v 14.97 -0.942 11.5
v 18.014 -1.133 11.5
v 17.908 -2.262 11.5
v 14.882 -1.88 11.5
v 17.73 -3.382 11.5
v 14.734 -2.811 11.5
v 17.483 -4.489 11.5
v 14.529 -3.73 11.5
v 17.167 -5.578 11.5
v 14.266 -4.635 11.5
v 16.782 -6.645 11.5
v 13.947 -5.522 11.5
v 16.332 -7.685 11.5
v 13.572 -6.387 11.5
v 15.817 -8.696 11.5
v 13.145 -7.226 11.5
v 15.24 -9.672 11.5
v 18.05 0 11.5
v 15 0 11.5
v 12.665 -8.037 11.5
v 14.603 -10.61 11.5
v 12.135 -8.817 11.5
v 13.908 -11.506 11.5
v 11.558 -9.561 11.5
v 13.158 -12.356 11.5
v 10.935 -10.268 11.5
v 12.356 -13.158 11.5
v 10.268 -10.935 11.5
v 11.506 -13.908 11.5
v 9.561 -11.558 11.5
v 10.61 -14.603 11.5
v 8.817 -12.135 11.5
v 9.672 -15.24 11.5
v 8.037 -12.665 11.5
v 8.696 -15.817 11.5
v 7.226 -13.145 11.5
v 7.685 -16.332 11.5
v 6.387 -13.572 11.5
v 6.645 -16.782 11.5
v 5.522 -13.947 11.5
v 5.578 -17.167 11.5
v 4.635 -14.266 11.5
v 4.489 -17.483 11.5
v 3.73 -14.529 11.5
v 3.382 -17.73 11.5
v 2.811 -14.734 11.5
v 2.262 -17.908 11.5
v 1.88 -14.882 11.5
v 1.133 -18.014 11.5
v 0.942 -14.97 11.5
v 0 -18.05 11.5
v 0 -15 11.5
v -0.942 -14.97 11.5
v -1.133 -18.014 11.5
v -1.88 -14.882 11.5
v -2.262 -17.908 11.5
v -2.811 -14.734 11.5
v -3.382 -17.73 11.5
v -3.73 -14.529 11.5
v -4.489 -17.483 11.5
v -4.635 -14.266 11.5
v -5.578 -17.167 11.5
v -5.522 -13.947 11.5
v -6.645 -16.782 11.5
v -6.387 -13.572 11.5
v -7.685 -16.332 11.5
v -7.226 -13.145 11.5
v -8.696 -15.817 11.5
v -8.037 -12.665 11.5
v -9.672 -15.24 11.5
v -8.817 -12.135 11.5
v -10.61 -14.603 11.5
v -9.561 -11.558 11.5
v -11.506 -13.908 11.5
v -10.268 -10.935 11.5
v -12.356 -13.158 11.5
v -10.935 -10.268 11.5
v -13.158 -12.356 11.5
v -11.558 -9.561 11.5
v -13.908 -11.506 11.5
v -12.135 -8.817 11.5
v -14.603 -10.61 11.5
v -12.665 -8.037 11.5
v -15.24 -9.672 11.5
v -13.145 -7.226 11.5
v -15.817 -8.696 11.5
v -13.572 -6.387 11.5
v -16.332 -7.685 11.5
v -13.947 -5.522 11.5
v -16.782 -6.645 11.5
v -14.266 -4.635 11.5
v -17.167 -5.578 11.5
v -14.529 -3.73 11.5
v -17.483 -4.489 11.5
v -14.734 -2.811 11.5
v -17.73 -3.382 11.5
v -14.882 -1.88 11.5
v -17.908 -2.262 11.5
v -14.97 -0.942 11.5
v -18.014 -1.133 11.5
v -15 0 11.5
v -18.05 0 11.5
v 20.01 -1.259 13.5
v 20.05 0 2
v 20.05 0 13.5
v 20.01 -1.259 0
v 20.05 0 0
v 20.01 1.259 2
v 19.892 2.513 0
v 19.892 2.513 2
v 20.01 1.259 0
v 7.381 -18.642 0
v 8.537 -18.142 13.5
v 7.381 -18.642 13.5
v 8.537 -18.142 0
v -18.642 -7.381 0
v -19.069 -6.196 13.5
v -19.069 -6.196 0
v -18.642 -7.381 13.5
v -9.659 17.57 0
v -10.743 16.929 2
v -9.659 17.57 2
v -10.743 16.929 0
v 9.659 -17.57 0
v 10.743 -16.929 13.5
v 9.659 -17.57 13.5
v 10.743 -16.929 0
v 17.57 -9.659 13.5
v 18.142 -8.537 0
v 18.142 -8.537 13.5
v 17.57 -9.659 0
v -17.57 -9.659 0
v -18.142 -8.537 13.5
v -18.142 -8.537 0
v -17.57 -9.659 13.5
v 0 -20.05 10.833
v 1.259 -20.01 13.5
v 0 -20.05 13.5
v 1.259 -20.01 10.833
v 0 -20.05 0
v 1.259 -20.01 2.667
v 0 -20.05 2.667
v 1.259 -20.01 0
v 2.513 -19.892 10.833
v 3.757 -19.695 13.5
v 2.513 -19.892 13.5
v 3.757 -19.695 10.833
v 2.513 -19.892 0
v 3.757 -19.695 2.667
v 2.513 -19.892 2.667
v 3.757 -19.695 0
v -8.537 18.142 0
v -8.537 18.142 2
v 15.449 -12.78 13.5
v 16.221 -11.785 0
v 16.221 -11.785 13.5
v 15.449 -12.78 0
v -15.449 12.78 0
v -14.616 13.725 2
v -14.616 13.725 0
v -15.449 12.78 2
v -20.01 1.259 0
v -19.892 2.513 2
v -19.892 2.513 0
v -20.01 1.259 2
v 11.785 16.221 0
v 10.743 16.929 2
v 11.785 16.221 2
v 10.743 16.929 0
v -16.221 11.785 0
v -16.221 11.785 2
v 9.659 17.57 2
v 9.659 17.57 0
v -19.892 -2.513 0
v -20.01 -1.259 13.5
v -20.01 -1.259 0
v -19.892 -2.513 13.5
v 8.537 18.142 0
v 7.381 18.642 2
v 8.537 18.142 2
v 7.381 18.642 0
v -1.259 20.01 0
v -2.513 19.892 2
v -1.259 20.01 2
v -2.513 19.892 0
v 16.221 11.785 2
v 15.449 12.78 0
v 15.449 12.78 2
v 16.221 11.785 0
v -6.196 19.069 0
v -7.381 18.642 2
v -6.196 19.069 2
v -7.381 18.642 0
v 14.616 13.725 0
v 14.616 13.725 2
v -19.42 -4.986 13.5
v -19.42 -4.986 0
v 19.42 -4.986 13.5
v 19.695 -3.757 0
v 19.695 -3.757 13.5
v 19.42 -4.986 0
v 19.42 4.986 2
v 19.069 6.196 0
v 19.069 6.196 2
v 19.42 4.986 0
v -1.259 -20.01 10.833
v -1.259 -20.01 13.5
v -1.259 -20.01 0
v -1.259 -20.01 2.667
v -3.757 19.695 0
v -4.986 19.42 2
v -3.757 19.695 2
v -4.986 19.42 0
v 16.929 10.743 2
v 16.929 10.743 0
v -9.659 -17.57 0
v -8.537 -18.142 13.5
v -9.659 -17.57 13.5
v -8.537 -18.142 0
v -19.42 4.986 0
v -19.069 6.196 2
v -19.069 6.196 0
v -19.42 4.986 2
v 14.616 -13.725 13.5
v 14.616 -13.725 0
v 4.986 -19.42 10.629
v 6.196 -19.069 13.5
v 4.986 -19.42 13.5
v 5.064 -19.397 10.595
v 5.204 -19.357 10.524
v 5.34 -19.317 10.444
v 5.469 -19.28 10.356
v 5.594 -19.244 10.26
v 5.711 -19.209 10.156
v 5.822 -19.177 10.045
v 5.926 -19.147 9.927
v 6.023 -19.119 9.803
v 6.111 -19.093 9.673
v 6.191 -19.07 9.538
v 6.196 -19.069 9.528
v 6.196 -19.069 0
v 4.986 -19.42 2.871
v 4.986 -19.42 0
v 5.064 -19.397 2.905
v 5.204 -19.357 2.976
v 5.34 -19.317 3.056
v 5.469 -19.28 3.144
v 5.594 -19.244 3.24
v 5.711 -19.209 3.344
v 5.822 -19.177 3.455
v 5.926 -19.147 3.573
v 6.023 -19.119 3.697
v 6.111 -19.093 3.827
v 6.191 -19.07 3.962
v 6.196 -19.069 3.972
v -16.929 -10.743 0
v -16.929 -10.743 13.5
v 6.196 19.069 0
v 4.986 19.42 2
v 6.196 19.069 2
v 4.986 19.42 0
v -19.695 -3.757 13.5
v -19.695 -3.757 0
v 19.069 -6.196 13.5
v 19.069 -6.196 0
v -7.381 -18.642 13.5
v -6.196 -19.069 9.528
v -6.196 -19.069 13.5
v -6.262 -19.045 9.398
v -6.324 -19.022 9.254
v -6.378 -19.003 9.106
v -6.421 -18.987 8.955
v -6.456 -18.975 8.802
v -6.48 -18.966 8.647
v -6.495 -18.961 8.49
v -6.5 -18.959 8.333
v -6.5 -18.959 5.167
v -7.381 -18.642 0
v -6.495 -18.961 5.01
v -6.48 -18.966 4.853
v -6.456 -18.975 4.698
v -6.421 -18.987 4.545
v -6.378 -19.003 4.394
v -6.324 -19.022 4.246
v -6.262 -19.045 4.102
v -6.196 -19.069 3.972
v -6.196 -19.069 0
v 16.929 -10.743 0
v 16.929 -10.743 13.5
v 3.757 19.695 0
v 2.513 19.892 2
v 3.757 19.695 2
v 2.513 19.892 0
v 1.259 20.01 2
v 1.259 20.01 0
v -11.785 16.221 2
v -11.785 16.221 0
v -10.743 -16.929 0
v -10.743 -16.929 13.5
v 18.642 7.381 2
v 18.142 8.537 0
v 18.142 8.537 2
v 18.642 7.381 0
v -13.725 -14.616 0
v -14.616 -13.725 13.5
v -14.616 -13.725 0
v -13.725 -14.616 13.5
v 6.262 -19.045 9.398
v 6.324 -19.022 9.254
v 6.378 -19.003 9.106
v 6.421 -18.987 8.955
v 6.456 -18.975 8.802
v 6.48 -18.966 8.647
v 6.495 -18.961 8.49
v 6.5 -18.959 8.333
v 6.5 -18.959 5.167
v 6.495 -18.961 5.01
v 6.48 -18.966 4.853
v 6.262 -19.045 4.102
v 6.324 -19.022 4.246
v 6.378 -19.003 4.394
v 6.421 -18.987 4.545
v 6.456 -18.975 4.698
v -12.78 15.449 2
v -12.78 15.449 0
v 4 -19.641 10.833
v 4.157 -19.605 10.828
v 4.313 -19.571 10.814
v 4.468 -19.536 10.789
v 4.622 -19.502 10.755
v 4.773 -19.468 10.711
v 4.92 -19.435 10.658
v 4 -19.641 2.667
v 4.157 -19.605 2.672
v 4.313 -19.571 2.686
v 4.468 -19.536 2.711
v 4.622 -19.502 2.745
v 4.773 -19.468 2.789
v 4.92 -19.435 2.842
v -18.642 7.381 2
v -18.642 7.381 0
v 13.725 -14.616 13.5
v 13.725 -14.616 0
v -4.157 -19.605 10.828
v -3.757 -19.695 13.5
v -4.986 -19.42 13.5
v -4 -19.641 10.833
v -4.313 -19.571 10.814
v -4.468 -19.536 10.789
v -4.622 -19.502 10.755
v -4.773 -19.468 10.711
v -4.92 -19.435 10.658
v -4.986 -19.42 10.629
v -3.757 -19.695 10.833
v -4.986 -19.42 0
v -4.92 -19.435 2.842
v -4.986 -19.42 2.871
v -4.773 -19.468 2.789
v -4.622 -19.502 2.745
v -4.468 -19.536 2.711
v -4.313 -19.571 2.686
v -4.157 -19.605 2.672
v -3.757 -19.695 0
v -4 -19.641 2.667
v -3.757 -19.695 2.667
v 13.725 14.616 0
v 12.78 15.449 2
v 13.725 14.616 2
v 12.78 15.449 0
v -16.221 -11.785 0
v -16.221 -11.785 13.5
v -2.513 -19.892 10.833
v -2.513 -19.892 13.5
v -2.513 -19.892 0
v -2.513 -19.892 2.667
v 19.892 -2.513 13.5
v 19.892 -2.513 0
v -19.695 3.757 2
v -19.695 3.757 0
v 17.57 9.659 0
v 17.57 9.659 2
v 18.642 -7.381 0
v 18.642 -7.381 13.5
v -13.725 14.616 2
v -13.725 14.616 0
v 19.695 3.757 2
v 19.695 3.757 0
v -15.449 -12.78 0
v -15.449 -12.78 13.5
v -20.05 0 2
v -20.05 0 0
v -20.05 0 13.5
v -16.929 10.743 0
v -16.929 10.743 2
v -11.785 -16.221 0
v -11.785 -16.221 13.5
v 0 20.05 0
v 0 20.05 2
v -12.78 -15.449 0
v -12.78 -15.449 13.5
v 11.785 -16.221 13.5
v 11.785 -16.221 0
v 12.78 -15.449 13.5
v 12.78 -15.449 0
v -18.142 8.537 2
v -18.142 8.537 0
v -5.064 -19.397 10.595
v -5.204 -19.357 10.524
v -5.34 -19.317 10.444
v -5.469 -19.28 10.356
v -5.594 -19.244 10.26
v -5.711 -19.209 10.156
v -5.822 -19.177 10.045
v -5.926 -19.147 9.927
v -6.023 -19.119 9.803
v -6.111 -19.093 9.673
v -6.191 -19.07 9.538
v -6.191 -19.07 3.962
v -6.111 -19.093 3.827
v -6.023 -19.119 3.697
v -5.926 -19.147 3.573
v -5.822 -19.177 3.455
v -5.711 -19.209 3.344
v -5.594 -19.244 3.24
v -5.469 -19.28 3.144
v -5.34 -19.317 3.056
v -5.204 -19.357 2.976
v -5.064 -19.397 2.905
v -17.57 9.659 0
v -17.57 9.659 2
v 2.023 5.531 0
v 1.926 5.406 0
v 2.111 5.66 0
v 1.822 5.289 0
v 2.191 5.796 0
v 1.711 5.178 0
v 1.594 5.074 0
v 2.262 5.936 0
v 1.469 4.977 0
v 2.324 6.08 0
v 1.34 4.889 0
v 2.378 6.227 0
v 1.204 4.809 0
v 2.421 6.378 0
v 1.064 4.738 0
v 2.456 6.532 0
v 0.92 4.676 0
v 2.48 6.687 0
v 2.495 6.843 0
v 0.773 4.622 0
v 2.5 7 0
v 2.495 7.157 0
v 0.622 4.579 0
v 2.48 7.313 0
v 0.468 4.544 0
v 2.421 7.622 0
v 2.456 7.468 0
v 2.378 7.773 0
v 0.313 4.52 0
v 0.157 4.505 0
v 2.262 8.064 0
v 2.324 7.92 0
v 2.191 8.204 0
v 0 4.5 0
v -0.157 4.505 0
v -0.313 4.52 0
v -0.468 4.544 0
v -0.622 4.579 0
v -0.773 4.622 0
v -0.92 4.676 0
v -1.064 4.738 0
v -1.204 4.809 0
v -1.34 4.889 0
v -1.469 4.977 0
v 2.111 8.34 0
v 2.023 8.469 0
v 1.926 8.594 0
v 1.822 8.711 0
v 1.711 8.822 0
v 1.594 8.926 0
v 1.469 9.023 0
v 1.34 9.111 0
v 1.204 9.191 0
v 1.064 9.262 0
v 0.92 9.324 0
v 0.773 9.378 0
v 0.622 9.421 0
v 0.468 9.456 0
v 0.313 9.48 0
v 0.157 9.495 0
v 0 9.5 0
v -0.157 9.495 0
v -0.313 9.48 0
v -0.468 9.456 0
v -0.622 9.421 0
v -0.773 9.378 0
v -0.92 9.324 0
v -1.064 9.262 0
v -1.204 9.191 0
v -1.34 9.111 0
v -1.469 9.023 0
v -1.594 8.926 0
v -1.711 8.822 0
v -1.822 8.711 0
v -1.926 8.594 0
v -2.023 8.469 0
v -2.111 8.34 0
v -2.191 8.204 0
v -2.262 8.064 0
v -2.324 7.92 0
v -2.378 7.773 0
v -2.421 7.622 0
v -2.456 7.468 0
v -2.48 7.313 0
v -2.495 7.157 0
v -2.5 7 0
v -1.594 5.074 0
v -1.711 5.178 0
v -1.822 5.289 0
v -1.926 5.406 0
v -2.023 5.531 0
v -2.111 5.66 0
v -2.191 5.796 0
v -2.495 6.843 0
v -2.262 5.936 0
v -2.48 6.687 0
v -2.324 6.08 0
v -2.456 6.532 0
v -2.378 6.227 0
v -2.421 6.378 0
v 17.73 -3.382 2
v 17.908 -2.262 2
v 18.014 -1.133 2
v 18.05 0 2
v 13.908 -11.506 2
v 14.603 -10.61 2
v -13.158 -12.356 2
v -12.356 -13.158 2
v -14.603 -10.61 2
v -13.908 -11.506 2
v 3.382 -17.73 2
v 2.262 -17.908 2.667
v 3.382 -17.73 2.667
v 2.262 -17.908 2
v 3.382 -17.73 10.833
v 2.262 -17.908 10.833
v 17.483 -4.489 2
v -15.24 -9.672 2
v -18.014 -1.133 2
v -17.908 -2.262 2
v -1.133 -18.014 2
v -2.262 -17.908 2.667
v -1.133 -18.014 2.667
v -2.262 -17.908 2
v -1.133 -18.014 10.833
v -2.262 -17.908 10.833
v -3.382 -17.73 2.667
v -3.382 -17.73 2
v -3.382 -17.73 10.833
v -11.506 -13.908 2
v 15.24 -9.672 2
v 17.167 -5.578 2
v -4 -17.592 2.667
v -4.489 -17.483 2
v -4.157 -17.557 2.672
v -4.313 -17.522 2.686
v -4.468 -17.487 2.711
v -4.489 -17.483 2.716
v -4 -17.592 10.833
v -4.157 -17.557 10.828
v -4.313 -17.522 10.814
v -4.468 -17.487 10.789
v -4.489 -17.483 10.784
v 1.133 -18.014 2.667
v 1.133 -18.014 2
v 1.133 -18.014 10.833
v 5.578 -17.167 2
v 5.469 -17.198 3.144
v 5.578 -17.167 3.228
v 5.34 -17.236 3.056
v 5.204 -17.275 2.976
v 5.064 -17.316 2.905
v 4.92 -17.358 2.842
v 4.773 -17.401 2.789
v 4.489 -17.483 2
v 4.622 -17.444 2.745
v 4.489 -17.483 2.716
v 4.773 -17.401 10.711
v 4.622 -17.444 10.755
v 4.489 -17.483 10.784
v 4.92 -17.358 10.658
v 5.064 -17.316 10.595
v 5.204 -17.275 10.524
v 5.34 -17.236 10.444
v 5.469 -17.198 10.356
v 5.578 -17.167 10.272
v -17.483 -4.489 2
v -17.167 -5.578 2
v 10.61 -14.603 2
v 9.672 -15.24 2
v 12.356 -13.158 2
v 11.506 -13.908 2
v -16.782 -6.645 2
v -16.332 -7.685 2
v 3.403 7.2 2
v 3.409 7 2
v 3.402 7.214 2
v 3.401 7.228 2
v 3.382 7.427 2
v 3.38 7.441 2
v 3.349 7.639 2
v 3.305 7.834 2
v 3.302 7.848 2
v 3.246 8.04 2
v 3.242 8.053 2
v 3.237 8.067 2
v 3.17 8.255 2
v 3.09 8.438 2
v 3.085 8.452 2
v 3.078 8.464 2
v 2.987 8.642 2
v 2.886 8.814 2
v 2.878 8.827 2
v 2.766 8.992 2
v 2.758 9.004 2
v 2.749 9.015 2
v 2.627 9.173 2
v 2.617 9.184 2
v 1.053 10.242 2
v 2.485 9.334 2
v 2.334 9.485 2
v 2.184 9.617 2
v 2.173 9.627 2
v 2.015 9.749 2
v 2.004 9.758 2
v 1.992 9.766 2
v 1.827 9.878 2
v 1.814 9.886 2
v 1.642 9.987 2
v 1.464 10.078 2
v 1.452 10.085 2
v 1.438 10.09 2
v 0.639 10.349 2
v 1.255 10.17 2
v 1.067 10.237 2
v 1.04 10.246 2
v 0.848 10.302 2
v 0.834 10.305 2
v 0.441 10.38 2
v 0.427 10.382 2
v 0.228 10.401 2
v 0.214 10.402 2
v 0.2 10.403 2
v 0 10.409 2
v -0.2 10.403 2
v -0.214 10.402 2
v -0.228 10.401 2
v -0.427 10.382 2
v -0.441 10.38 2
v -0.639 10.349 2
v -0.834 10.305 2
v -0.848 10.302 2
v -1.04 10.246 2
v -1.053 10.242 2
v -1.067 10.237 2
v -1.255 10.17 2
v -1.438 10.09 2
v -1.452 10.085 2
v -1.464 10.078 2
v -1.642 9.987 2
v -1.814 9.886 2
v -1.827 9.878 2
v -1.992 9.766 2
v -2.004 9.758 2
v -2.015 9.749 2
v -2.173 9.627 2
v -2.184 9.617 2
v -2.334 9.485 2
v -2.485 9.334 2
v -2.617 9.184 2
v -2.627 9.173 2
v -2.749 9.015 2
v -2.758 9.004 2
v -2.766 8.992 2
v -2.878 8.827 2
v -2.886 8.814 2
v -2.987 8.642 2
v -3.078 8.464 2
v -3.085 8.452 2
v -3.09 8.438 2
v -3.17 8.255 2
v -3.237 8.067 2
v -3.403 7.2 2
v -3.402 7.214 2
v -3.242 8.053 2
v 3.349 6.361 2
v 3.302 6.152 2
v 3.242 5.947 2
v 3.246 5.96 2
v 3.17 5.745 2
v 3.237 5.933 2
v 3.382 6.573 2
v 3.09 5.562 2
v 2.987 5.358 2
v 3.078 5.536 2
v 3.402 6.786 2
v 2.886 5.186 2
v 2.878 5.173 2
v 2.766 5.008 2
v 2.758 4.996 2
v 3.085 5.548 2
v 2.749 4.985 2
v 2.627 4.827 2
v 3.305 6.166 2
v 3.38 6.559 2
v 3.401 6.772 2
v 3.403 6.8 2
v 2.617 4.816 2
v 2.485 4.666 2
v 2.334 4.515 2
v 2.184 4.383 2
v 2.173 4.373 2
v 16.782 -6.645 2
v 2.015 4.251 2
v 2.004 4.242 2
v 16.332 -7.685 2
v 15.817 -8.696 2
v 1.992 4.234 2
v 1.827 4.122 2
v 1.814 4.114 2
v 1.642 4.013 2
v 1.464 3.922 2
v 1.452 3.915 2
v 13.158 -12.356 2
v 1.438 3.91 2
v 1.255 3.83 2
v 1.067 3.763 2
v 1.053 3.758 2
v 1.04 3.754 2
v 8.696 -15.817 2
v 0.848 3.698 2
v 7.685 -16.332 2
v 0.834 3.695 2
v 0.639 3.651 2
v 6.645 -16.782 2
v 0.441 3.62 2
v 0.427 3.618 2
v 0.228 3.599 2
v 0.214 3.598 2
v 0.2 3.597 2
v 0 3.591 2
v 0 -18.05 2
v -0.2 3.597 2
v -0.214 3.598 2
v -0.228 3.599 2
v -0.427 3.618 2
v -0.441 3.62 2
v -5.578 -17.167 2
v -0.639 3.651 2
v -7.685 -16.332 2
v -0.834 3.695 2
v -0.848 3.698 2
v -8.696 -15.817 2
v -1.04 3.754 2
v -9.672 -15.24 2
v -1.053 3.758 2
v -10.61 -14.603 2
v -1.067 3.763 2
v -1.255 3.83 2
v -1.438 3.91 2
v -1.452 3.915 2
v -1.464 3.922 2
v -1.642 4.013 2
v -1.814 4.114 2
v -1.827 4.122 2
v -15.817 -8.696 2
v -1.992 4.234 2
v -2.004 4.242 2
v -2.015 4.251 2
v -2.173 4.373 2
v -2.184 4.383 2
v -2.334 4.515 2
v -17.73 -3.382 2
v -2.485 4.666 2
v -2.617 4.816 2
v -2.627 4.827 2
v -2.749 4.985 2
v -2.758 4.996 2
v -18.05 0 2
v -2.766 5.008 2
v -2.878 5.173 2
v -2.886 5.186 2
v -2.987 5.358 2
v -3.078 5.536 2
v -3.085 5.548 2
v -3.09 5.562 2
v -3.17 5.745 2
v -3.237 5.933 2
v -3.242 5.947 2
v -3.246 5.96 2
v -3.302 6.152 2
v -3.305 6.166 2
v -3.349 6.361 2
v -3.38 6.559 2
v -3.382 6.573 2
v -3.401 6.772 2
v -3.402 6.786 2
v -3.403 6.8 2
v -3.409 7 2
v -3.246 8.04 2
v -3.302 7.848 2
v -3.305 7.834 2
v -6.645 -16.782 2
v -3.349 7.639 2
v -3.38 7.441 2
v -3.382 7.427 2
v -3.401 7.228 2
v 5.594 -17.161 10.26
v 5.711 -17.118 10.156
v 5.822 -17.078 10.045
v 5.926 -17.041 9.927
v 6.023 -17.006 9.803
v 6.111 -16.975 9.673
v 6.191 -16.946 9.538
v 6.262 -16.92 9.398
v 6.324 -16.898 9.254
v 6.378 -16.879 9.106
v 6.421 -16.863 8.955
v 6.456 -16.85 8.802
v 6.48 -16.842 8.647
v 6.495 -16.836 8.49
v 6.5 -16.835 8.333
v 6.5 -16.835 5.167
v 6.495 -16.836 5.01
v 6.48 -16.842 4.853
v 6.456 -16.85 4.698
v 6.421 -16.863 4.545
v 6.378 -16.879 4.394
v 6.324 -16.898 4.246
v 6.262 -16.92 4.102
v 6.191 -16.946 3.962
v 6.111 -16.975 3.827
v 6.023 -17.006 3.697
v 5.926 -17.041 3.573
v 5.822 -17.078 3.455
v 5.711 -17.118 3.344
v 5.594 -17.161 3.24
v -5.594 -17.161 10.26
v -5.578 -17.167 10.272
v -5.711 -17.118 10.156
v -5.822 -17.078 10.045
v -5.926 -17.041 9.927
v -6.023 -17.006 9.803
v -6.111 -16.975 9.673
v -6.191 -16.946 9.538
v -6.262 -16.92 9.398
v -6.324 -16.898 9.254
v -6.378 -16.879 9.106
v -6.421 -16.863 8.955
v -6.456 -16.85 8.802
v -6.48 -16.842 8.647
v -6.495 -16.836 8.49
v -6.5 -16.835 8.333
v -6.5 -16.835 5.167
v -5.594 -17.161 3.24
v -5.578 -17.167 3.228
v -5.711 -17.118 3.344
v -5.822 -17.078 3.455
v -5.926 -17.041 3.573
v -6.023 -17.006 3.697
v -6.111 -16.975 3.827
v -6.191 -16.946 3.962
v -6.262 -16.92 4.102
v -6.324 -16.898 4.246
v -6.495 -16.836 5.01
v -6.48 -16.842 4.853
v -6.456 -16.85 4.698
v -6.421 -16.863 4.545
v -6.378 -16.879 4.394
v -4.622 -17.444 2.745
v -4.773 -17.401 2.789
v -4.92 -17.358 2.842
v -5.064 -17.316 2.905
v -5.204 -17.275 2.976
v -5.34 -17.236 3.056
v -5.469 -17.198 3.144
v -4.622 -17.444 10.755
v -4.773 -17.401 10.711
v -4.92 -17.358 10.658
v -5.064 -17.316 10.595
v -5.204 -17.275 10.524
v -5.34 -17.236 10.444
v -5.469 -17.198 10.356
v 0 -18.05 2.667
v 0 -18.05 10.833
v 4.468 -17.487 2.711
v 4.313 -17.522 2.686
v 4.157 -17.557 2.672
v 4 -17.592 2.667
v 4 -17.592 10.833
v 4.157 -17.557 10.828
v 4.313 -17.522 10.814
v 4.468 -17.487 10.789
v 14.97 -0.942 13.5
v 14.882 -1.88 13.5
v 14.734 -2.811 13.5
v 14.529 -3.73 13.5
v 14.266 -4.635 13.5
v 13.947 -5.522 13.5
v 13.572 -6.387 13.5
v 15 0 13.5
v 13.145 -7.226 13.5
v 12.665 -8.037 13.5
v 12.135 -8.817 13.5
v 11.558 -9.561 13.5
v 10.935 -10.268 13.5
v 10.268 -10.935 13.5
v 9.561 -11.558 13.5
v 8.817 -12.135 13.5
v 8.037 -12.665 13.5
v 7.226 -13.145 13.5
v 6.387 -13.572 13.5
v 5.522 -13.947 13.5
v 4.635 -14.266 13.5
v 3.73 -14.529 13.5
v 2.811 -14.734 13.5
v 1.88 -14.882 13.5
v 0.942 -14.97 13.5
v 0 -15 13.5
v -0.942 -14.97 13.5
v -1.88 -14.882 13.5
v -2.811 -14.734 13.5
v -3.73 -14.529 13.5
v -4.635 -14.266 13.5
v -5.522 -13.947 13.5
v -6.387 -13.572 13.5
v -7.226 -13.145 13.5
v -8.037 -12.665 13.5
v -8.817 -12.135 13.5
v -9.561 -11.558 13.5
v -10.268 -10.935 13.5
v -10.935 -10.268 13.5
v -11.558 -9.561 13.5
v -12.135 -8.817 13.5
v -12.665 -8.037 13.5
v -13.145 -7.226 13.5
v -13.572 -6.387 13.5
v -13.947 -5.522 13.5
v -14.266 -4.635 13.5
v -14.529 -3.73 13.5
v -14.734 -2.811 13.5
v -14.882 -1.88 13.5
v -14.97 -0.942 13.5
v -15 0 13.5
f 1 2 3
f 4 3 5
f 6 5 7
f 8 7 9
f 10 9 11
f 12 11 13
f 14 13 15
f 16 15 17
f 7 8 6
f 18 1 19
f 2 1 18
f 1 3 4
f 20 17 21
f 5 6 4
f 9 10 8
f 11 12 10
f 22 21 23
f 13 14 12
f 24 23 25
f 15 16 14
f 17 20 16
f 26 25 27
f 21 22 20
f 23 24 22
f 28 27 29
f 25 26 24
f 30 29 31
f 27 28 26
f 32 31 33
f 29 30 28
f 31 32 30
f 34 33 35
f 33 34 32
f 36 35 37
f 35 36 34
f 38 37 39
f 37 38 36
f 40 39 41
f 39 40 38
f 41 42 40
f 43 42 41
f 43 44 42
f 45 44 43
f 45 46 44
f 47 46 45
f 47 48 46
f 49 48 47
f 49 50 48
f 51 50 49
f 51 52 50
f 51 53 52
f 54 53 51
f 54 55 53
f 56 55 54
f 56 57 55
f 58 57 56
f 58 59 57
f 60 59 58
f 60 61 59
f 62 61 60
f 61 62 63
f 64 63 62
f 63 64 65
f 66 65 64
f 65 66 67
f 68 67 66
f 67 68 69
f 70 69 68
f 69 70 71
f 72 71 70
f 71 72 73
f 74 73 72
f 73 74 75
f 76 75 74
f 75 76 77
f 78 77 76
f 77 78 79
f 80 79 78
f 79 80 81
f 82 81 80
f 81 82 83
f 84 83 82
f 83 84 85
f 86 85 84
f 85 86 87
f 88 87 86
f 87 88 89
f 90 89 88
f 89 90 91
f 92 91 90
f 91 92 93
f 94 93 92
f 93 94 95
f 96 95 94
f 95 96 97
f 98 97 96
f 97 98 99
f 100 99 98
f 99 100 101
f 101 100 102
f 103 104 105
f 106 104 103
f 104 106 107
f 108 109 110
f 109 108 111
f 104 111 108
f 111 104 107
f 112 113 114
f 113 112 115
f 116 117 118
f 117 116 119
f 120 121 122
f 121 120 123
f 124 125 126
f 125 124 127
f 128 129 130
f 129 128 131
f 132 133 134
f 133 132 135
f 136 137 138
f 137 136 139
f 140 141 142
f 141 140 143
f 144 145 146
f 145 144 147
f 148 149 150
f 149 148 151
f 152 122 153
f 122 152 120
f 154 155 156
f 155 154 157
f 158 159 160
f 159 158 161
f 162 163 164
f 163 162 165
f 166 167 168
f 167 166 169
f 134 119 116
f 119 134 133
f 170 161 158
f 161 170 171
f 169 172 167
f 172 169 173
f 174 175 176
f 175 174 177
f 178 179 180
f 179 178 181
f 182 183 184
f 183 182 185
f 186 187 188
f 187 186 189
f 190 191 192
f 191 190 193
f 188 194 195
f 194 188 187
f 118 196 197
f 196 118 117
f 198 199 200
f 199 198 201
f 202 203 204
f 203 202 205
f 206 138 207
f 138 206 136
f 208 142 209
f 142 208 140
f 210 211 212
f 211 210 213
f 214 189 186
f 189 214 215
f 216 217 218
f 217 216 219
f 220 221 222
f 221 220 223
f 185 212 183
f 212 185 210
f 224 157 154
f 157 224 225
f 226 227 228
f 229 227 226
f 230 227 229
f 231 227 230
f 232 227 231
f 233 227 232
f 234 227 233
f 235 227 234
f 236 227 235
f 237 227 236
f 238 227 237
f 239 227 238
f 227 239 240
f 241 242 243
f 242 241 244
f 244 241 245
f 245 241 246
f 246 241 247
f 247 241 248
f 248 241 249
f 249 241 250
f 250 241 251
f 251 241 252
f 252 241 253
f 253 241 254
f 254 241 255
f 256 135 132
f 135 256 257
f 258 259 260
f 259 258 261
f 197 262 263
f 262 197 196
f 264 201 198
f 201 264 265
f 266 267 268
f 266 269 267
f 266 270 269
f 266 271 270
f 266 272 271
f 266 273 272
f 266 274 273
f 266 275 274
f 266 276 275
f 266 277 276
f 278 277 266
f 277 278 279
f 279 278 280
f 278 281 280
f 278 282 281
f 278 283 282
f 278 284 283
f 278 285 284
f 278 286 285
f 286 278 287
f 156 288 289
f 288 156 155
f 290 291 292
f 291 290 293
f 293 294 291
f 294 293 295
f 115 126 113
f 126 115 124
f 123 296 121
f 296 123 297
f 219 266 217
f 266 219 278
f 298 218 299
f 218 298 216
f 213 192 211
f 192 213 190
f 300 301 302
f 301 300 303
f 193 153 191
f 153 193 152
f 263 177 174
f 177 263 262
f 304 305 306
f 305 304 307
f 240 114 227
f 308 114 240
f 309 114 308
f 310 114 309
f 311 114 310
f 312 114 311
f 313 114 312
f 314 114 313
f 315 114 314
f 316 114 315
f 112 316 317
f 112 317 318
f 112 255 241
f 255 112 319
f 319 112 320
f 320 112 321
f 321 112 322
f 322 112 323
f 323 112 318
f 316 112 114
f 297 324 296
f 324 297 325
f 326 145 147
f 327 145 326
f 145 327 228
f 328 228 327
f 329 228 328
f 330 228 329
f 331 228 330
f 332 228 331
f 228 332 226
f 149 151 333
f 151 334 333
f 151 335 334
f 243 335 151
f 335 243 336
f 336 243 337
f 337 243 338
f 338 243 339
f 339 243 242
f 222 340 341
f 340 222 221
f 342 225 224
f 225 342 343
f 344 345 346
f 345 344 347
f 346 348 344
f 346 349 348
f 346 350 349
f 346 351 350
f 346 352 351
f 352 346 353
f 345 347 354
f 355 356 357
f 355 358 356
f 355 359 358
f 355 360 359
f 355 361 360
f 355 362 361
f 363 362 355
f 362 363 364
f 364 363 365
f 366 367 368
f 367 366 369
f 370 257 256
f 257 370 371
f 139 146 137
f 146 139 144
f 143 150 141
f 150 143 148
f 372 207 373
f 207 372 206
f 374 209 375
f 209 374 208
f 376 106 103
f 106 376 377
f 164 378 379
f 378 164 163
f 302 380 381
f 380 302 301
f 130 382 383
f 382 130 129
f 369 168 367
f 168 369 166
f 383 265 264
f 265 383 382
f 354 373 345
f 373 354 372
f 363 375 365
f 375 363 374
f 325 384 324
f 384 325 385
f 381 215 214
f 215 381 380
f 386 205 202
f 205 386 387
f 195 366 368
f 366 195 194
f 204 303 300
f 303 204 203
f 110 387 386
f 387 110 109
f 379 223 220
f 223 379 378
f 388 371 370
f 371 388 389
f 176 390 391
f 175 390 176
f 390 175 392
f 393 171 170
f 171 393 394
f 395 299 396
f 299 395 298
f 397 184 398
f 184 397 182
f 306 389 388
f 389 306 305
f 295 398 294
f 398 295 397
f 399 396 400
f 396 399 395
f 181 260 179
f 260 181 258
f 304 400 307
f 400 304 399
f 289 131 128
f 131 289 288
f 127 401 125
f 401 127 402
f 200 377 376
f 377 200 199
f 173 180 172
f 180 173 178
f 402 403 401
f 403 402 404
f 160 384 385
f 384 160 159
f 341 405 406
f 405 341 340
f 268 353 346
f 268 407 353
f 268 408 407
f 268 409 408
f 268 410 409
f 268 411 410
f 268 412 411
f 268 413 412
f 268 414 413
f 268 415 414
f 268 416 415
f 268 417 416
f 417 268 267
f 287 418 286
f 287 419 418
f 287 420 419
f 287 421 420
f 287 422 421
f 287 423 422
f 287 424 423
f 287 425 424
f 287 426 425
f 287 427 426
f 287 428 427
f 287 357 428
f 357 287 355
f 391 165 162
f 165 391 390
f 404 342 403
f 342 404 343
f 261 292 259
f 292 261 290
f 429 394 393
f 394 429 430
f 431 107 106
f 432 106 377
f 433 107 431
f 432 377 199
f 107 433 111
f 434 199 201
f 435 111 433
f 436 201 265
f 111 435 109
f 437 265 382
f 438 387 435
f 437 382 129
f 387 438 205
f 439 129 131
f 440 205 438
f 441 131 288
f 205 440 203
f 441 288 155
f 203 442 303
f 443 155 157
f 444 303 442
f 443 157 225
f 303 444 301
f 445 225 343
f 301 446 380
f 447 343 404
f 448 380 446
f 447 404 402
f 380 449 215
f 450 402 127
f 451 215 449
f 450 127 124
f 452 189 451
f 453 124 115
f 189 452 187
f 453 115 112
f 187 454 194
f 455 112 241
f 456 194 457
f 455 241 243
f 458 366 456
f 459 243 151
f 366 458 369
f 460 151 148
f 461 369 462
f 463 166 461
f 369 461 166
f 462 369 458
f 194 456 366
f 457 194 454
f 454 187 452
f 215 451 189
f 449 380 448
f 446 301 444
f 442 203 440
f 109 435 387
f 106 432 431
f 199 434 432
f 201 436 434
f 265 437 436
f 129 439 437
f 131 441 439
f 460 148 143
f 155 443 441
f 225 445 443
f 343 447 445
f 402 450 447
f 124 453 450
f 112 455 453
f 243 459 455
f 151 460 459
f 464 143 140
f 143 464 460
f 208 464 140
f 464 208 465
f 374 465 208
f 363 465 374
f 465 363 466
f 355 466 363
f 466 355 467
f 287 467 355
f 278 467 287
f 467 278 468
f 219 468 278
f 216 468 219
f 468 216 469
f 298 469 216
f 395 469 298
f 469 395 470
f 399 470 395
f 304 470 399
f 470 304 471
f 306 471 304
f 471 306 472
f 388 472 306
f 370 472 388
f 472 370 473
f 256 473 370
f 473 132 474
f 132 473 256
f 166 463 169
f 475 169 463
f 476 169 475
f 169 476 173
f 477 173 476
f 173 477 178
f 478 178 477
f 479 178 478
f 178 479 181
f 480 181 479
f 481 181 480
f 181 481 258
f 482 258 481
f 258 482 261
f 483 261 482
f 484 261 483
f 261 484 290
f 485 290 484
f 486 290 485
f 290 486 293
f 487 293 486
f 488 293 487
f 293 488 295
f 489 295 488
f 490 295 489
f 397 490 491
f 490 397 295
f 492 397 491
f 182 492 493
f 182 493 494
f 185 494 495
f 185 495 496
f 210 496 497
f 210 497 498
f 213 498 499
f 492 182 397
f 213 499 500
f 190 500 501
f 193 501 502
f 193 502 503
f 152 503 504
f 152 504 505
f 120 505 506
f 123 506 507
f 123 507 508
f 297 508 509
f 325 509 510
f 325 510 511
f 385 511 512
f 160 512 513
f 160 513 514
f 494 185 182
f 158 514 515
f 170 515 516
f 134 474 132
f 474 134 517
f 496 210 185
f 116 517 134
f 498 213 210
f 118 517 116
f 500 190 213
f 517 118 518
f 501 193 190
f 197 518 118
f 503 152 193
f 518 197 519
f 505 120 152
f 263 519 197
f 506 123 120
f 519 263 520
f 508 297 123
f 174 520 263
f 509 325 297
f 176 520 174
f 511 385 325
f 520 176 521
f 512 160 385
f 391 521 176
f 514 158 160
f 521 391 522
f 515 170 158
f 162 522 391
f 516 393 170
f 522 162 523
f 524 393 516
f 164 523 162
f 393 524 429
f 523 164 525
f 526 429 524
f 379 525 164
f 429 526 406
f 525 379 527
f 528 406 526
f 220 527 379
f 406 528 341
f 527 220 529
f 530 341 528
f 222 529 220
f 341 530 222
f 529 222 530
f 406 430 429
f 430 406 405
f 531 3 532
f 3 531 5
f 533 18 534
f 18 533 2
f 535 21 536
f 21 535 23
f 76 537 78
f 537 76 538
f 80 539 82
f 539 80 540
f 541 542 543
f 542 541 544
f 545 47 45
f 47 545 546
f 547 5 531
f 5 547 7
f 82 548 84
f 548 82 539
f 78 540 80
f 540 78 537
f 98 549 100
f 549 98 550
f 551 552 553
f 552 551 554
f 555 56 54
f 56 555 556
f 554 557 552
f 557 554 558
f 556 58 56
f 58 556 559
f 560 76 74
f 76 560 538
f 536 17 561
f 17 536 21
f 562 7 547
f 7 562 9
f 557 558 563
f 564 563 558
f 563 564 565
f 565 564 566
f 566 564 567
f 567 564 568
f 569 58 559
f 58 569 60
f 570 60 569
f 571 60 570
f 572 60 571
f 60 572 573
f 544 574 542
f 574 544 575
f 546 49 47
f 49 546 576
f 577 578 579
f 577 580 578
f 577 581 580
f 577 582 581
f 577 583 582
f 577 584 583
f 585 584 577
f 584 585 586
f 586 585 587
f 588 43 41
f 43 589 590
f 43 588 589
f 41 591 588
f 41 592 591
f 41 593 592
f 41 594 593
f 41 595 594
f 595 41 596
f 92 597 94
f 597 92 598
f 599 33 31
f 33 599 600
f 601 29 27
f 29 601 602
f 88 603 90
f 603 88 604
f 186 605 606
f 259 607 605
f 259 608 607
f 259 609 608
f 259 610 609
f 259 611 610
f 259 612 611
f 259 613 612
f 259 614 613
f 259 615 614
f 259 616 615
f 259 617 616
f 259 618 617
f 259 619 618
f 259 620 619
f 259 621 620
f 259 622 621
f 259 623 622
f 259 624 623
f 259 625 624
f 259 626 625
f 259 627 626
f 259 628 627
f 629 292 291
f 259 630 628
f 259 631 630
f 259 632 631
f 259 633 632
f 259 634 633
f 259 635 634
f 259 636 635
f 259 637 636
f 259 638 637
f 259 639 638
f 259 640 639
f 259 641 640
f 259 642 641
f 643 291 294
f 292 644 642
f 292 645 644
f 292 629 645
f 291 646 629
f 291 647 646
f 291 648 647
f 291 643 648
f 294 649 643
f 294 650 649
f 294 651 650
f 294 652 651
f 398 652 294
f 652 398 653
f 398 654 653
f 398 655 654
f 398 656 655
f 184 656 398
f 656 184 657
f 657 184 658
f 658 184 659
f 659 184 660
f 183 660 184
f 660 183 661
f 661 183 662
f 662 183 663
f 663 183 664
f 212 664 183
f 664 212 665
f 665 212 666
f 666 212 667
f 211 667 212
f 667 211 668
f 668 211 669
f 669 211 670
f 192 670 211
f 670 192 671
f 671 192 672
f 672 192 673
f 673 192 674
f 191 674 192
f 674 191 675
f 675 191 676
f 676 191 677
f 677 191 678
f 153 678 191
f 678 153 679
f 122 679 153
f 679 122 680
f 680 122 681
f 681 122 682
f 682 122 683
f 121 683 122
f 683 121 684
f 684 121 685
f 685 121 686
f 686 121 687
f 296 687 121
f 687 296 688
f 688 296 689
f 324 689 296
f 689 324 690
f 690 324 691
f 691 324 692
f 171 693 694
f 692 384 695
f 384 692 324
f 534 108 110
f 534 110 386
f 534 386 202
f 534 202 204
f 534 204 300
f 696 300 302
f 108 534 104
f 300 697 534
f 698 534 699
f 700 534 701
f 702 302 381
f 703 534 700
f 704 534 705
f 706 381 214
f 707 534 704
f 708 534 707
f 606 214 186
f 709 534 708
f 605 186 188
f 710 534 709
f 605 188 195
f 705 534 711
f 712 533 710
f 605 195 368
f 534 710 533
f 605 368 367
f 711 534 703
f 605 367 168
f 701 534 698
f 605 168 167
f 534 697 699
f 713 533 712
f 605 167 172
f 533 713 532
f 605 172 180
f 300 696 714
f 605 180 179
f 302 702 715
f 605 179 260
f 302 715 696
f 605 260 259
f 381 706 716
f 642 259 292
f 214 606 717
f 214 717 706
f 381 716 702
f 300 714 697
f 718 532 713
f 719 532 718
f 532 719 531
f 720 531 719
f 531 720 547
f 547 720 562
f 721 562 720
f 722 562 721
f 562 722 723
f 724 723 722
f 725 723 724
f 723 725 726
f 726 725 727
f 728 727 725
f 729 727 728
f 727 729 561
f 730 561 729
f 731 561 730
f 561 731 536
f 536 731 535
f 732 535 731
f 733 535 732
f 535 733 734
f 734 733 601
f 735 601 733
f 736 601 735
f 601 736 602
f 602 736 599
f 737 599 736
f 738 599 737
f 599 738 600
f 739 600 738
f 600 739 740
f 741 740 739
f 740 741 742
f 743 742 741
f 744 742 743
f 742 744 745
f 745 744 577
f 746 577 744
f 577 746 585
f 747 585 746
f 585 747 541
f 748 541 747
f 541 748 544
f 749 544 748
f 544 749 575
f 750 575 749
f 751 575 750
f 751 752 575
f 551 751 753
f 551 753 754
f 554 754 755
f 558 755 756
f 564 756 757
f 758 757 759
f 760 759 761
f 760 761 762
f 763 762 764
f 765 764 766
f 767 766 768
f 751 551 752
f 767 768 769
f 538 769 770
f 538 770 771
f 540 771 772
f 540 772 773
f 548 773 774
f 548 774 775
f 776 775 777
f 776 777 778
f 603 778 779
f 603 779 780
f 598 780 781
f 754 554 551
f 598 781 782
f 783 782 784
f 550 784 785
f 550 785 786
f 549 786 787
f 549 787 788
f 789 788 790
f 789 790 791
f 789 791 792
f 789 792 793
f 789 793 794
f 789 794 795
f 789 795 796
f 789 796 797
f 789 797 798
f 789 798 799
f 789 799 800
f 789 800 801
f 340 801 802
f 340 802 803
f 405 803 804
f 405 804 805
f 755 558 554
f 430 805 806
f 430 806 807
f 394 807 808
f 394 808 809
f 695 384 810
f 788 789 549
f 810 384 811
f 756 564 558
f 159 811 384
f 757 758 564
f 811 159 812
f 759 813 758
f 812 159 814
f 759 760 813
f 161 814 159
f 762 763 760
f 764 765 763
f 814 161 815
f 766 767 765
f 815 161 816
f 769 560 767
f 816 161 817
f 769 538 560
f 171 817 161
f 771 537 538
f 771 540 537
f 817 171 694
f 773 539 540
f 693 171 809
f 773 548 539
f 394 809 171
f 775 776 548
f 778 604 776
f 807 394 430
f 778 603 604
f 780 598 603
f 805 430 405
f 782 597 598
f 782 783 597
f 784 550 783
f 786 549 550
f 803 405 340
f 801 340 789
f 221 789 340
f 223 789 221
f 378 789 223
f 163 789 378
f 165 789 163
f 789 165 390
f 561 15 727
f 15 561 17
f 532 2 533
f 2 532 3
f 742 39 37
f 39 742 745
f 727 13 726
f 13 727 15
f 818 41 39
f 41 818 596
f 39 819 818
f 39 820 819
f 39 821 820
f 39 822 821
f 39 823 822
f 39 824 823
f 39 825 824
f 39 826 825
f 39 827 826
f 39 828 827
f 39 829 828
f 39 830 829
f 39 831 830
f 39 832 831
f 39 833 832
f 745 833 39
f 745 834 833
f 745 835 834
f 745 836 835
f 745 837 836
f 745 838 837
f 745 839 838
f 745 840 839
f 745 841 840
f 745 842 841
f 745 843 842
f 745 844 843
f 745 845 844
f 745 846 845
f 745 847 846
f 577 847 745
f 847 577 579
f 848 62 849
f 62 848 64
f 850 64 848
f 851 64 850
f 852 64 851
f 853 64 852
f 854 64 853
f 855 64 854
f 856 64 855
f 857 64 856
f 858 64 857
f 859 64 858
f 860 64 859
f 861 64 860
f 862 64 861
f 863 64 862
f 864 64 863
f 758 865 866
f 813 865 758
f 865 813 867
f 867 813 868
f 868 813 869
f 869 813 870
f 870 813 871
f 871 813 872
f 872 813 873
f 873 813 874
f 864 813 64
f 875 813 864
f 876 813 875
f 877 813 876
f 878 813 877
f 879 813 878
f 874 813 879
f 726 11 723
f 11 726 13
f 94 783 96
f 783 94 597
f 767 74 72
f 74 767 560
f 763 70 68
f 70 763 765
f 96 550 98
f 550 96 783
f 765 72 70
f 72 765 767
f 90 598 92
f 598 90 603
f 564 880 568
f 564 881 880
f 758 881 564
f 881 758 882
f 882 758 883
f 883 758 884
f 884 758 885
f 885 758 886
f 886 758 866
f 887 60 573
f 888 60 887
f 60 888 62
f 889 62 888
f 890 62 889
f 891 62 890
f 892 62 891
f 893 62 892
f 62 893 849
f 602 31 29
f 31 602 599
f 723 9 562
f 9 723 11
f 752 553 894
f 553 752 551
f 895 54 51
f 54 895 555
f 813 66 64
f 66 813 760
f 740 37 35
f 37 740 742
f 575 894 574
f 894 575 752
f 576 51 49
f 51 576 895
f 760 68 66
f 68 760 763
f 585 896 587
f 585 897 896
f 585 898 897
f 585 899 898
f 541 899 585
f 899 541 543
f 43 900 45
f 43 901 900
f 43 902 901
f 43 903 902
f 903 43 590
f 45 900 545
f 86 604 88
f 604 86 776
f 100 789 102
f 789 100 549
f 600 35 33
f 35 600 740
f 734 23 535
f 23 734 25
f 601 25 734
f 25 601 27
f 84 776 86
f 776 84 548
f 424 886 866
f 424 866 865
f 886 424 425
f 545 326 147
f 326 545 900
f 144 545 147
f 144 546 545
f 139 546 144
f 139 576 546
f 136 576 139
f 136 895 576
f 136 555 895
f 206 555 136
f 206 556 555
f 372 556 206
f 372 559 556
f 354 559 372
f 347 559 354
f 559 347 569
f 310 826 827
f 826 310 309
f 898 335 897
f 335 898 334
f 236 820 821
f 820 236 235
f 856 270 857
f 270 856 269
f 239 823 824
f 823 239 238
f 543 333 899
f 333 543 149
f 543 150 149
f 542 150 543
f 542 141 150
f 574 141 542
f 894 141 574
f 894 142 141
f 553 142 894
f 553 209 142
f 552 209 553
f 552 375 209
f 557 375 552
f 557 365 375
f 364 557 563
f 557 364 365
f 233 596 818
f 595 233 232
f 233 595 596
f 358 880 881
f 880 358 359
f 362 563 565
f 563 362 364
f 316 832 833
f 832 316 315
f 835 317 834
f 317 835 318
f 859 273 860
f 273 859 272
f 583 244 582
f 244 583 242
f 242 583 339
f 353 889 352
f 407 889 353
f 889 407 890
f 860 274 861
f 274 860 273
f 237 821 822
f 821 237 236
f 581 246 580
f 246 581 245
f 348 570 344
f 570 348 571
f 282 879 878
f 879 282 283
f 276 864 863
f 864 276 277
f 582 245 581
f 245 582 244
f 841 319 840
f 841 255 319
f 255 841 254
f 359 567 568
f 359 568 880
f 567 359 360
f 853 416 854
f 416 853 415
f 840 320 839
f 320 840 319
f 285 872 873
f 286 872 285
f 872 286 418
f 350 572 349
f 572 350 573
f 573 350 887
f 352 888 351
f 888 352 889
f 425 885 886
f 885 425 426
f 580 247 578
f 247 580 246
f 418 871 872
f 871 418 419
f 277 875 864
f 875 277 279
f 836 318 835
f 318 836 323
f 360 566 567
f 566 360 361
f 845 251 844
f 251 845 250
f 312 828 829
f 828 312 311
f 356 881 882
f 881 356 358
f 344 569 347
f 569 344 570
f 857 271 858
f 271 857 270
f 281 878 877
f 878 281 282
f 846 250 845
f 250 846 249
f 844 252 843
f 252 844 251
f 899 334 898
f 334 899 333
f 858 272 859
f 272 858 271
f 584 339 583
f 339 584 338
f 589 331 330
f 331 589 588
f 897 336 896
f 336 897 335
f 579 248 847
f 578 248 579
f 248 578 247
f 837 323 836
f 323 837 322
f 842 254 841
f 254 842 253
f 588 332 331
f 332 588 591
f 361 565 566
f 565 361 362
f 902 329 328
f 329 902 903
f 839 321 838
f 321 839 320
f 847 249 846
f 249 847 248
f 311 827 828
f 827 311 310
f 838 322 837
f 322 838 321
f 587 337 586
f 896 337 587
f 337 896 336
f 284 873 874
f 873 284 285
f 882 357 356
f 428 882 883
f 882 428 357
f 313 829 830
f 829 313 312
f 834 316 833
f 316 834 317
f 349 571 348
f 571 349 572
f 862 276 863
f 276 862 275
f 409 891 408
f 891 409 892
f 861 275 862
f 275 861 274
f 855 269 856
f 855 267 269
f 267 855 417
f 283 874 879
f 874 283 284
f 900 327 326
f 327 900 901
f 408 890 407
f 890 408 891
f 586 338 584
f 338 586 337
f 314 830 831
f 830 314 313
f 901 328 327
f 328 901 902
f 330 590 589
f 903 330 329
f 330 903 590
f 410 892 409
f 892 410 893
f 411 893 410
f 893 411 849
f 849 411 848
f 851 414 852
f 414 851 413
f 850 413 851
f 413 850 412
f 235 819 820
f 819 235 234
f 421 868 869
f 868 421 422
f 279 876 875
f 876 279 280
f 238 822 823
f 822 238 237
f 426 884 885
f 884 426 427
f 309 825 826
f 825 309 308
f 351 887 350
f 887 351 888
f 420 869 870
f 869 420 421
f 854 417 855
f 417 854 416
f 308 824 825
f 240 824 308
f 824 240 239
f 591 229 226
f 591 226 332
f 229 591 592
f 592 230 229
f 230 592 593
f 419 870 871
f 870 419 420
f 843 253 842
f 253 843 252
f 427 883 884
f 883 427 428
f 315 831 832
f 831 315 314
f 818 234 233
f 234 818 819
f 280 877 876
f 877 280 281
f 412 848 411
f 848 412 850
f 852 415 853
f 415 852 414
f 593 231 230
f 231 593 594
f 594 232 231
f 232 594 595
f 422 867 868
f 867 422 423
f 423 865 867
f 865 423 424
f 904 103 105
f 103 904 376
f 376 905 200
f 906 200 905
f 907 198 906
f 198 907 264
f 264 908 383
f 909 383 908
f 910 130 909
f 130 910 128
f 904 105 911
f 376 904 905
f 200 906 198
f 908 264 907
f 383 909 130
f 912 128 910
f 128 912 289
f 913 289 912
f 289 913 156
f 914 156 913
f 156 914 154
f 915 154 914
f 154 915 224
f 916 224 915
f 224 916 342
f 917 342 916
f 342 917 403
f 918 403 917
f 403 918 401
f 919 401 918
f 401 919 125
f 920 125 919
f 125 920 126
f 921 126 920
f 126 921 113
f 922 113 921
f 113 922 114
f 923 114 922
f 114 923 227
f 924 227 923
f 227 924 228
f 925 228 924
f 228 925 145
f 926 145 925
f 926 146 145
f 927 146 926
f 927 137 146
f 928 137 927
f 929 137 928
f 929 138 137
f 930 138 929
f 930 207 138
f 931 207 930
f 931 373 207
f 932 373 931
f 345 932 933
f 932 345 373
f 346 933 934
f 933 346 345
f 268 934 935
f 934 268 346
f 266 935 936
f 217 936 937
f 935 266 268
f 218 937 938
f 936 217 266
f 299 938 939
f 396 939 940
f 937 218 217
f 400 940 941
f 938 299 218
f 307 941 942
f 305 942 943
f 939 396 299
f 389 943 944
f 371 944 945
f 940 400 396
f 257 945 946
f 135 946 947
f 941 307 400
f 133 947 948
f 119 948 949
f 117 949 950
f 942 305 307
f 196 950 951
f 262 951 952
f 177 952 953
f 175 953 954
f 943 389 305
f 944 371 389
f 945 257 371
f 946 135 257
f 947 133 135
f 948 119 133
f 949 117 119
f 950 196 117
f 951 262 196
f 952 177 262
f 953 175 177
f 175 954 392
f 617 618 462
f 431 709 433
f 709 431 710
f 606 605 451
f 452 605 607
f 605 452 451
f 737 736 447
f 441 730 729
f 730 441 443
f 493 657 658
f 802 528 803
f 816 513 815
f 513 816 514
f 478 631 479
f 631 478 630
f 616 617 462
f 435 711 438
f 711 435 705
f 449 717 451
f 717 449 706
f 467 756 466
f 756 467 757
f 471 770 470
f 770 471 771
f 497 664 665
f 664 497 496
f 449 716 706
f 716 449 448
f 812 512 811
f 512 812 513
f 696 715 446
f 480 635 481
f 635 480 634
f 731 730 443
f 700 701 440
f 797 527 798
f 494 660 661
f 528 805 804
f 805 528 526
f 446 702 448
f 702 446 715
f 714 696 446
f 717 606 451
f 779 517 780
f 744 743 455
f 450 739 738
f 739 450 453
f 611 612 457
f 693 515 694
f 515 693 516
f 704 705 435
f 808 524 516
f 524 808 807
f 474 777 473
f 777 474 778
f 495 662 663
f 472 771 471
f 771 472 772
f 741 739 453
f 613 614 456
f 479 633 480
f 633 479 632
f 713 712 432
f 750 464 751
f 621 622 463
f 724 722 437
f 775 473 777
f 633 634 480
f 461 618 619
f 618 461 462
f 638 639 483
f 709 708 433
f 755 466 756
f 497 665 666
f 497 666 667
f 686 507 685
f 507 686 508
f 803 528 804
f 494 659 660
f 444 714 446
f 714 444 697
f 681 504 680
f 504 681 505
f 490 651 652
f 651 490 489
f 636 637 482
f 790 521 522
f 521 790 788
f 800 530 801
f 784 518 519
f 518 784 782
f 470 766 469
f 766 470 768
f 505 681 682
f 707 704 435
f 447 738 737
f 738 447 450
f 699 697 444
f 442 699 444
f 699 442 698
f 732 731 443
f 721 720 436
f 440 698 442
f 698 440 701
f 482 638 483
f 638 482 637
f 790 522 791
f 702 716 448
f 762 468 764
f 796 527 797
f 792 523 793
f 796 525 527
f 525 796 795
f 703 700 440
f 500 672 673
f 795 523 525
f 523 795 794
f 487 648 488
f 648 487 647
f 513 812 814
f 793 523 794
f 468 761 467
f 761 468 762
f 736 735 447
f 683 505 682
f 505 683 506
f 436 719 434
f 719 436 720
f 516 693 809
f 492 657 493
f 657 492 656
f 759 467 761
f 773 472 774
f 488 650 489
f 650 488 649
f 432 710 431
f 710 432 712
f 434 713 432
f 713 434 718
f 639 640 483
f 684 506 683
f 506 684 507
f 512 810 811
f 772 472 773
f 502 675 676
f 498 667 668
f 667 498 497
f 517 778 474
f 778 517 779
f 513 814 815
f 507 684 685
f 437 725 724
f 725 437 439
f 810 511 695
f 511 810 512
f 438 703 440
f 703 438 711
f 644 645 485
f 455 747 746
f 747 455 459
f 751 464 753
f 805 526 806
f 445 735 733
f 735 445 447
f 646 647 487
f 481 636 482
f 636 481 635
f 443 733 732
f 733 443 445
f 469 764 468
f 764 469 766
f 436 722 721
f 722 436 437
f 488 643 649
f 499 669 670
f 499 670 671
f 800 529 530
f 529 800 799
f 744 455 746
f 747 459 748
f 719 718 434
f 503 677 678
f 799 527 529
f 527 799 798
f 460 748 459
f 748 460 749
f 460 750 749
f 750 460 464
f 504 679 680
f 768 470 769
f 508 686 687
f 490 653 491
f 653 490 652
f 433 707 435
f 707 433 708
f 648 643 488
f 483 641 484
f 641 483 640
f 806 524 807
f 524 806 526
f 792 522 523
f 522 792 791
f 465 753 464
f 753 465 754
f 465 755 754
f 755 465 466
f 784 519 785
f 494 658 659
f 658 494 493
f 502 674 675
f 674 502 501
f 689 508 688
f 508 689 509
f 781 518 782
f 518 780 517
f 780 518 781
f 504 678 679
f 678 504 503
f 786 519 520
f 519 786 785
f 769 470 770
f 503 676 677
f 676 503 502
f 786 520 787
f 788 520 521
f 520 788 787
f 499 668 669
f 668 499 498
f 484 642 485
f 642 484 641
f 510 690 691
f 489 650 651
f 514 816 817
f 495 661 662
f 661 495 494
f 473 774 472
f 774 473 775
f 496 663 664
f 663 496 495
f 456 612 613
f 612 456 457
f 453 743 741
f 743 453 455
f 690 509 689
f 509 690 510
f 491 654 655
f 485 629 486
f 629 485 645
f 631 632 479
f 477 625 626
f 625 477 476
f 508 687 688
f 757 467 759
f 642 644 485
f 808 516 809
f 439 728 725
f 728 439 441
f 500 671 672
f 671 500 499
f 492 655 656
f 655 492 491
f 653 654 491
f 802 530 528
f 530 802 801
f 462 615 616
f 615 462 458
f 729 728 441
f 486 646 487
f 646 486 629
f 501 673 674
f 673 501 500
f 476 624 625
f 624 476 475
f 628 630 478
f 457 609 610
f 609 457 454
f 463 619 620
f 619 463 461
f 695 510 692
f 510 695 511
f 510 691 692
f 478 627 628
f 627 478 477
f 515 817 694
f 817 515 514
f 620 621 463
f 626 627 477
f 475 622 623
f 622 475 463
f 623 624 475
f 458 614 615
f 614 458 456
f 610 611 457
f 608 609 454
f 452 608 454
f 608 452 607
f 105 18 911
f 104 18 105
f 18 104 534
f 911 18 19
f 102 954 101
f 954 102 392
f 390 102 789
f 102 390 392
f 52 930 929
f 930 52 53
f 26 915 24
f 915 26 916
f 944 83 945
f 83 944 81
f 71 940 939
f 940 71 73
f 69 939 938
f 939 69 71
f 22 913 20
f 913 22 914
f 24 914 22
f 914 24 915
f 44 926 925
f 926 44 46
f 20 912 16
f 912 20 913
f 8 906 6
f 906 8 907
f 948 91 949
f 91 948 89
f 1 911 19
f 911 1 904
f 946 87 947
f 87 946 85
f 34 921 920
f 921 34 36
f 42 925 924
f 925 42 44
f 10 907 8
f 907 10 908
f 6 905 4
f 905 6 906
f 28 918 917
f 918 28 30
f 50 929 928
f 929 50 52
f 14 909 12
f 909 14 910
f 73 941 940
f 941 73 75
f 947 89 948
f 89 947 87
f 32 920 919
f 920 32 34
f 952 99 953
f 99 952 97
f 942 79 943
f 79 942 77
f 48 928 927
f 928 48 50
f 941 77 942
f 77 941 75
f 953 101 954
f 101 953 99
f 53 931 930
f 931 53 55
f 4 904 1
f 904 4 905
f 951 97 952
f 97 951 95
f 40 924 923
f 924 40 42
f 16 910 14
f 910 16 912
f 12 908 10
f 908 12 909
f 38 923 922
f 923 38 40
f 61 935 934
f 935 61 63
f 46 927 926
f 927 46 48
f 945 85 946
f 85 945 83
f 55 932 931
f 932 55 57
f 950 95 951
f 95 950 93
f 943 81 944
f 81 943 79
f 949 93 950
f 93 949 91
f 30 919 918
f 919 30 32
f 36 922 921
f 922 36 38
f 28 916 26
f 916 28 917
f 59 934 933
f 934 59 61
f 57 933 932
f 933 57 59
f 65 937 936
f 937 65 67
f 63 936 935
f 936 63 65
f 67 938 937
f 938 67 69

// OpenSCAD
// Matthew Sparks
// 2018-05-13
//
// units in 1mm
// Bracket with screw hole for mounting Xiaomi Mi Temperature and Humidity Sensor
// Does not fit Xiaomi Aqara

sensorWidth = 35.6;
//sensorHeight = 9.8;
sensorHeight = 9;

widthTolerance = 0.5;
heightTolerance = 0.5;

internalSensorWidth = sensorWidth+widthTolerance;
internalSensorHeight = sensorHeight+heightTolerance;

bracketThickness = 4;
rearThickness = 2;

frontHoleSize = 30;

holeWidth = 8;
holeHeight = internalSensorHeight/3;
holeRoundness = 5;

//fastenerType = "NONE";
fastenerType = "SCREW";
//fastenerType = "NAIL";

screwOffset = 7;
screwAngle = 90;
nailHeadSize = 7.5;
shaftSize = 5;

$fn = 100;

difference(){
    union(){
        
        difference(){
            // outside shape
            cylinder(internalSensorHeight+rearThickness,d=internalSensorWidth+bracketThickness,false);
            
            // inside diameter
            translate([0,0,rearThickness]){
                cylinder(internalSensorHeight+rearThickness,d=internalSensorWidth,false);
            }
            
            // cutout bottom hole
            translate([-holeWidth/2,(-internalSensorWidth/2)+5.5,(rearThickness+(holeRoundness/2))+((internalSensorHeight)-(holeHeight+holeRoundness))/2]){
                rotate([90,0,0]){
                    minkowski(){
                        cube([holeWidth,holeHeight,10],false);
                        cylinder(1,d=holeRoundness,false);
                    }

                }
            }
        }
        
        // add front
        translate([0,0,internalSensorHeight+rearThickness]){
            cylinder(rearThickness,d=internalSensorWidth+bracketThickness,false);
        }
    }
   
    // cut off top
    translate([-((internalSensorWidth+bracketThickness+1)/2),0,rearThickness]){
        cube([internalSensorWidth+bracketThickness+1,(internalSensorWidth+bracketThickness+1)/2,20],(internalSensorHeight+rearThickness+1));
    }
    
    // cut off front
    translate([0,0,rearThickness+internalSensorHeight-1]){
        cylinder(bracketThickness+2,d=frontHoleSize,false);
    }
    
    translate([0,screwOffset,0]){
        if(fastenerType=="SCREW") {
            // screw hole
            union(){
                //main hole
                translate([0,0,-0.1]){
                    cylinder(rearThickness+0.2,d=shaftSize,false);
                }
                //countersink
                cylinder(rearThickness+0.2,d1=shaftSize,d2=shaftSize+(rearThickness*tan(screwAngle/2)),false);        
            }
        }
        else if(fastenerType=="NAIL"){        
            union(){
                //main hole
                translate([0,0,-0.1]){
                    cylinder(rearThickness+0.2,d=shaftSize,false);
                }
                //countersink
                translate([0,0,rearThickness/2]){
                    cylinder(rearThickness/2+0.2,d=nailHeadSize,false);
                }
            }
        }
    }
}

    
